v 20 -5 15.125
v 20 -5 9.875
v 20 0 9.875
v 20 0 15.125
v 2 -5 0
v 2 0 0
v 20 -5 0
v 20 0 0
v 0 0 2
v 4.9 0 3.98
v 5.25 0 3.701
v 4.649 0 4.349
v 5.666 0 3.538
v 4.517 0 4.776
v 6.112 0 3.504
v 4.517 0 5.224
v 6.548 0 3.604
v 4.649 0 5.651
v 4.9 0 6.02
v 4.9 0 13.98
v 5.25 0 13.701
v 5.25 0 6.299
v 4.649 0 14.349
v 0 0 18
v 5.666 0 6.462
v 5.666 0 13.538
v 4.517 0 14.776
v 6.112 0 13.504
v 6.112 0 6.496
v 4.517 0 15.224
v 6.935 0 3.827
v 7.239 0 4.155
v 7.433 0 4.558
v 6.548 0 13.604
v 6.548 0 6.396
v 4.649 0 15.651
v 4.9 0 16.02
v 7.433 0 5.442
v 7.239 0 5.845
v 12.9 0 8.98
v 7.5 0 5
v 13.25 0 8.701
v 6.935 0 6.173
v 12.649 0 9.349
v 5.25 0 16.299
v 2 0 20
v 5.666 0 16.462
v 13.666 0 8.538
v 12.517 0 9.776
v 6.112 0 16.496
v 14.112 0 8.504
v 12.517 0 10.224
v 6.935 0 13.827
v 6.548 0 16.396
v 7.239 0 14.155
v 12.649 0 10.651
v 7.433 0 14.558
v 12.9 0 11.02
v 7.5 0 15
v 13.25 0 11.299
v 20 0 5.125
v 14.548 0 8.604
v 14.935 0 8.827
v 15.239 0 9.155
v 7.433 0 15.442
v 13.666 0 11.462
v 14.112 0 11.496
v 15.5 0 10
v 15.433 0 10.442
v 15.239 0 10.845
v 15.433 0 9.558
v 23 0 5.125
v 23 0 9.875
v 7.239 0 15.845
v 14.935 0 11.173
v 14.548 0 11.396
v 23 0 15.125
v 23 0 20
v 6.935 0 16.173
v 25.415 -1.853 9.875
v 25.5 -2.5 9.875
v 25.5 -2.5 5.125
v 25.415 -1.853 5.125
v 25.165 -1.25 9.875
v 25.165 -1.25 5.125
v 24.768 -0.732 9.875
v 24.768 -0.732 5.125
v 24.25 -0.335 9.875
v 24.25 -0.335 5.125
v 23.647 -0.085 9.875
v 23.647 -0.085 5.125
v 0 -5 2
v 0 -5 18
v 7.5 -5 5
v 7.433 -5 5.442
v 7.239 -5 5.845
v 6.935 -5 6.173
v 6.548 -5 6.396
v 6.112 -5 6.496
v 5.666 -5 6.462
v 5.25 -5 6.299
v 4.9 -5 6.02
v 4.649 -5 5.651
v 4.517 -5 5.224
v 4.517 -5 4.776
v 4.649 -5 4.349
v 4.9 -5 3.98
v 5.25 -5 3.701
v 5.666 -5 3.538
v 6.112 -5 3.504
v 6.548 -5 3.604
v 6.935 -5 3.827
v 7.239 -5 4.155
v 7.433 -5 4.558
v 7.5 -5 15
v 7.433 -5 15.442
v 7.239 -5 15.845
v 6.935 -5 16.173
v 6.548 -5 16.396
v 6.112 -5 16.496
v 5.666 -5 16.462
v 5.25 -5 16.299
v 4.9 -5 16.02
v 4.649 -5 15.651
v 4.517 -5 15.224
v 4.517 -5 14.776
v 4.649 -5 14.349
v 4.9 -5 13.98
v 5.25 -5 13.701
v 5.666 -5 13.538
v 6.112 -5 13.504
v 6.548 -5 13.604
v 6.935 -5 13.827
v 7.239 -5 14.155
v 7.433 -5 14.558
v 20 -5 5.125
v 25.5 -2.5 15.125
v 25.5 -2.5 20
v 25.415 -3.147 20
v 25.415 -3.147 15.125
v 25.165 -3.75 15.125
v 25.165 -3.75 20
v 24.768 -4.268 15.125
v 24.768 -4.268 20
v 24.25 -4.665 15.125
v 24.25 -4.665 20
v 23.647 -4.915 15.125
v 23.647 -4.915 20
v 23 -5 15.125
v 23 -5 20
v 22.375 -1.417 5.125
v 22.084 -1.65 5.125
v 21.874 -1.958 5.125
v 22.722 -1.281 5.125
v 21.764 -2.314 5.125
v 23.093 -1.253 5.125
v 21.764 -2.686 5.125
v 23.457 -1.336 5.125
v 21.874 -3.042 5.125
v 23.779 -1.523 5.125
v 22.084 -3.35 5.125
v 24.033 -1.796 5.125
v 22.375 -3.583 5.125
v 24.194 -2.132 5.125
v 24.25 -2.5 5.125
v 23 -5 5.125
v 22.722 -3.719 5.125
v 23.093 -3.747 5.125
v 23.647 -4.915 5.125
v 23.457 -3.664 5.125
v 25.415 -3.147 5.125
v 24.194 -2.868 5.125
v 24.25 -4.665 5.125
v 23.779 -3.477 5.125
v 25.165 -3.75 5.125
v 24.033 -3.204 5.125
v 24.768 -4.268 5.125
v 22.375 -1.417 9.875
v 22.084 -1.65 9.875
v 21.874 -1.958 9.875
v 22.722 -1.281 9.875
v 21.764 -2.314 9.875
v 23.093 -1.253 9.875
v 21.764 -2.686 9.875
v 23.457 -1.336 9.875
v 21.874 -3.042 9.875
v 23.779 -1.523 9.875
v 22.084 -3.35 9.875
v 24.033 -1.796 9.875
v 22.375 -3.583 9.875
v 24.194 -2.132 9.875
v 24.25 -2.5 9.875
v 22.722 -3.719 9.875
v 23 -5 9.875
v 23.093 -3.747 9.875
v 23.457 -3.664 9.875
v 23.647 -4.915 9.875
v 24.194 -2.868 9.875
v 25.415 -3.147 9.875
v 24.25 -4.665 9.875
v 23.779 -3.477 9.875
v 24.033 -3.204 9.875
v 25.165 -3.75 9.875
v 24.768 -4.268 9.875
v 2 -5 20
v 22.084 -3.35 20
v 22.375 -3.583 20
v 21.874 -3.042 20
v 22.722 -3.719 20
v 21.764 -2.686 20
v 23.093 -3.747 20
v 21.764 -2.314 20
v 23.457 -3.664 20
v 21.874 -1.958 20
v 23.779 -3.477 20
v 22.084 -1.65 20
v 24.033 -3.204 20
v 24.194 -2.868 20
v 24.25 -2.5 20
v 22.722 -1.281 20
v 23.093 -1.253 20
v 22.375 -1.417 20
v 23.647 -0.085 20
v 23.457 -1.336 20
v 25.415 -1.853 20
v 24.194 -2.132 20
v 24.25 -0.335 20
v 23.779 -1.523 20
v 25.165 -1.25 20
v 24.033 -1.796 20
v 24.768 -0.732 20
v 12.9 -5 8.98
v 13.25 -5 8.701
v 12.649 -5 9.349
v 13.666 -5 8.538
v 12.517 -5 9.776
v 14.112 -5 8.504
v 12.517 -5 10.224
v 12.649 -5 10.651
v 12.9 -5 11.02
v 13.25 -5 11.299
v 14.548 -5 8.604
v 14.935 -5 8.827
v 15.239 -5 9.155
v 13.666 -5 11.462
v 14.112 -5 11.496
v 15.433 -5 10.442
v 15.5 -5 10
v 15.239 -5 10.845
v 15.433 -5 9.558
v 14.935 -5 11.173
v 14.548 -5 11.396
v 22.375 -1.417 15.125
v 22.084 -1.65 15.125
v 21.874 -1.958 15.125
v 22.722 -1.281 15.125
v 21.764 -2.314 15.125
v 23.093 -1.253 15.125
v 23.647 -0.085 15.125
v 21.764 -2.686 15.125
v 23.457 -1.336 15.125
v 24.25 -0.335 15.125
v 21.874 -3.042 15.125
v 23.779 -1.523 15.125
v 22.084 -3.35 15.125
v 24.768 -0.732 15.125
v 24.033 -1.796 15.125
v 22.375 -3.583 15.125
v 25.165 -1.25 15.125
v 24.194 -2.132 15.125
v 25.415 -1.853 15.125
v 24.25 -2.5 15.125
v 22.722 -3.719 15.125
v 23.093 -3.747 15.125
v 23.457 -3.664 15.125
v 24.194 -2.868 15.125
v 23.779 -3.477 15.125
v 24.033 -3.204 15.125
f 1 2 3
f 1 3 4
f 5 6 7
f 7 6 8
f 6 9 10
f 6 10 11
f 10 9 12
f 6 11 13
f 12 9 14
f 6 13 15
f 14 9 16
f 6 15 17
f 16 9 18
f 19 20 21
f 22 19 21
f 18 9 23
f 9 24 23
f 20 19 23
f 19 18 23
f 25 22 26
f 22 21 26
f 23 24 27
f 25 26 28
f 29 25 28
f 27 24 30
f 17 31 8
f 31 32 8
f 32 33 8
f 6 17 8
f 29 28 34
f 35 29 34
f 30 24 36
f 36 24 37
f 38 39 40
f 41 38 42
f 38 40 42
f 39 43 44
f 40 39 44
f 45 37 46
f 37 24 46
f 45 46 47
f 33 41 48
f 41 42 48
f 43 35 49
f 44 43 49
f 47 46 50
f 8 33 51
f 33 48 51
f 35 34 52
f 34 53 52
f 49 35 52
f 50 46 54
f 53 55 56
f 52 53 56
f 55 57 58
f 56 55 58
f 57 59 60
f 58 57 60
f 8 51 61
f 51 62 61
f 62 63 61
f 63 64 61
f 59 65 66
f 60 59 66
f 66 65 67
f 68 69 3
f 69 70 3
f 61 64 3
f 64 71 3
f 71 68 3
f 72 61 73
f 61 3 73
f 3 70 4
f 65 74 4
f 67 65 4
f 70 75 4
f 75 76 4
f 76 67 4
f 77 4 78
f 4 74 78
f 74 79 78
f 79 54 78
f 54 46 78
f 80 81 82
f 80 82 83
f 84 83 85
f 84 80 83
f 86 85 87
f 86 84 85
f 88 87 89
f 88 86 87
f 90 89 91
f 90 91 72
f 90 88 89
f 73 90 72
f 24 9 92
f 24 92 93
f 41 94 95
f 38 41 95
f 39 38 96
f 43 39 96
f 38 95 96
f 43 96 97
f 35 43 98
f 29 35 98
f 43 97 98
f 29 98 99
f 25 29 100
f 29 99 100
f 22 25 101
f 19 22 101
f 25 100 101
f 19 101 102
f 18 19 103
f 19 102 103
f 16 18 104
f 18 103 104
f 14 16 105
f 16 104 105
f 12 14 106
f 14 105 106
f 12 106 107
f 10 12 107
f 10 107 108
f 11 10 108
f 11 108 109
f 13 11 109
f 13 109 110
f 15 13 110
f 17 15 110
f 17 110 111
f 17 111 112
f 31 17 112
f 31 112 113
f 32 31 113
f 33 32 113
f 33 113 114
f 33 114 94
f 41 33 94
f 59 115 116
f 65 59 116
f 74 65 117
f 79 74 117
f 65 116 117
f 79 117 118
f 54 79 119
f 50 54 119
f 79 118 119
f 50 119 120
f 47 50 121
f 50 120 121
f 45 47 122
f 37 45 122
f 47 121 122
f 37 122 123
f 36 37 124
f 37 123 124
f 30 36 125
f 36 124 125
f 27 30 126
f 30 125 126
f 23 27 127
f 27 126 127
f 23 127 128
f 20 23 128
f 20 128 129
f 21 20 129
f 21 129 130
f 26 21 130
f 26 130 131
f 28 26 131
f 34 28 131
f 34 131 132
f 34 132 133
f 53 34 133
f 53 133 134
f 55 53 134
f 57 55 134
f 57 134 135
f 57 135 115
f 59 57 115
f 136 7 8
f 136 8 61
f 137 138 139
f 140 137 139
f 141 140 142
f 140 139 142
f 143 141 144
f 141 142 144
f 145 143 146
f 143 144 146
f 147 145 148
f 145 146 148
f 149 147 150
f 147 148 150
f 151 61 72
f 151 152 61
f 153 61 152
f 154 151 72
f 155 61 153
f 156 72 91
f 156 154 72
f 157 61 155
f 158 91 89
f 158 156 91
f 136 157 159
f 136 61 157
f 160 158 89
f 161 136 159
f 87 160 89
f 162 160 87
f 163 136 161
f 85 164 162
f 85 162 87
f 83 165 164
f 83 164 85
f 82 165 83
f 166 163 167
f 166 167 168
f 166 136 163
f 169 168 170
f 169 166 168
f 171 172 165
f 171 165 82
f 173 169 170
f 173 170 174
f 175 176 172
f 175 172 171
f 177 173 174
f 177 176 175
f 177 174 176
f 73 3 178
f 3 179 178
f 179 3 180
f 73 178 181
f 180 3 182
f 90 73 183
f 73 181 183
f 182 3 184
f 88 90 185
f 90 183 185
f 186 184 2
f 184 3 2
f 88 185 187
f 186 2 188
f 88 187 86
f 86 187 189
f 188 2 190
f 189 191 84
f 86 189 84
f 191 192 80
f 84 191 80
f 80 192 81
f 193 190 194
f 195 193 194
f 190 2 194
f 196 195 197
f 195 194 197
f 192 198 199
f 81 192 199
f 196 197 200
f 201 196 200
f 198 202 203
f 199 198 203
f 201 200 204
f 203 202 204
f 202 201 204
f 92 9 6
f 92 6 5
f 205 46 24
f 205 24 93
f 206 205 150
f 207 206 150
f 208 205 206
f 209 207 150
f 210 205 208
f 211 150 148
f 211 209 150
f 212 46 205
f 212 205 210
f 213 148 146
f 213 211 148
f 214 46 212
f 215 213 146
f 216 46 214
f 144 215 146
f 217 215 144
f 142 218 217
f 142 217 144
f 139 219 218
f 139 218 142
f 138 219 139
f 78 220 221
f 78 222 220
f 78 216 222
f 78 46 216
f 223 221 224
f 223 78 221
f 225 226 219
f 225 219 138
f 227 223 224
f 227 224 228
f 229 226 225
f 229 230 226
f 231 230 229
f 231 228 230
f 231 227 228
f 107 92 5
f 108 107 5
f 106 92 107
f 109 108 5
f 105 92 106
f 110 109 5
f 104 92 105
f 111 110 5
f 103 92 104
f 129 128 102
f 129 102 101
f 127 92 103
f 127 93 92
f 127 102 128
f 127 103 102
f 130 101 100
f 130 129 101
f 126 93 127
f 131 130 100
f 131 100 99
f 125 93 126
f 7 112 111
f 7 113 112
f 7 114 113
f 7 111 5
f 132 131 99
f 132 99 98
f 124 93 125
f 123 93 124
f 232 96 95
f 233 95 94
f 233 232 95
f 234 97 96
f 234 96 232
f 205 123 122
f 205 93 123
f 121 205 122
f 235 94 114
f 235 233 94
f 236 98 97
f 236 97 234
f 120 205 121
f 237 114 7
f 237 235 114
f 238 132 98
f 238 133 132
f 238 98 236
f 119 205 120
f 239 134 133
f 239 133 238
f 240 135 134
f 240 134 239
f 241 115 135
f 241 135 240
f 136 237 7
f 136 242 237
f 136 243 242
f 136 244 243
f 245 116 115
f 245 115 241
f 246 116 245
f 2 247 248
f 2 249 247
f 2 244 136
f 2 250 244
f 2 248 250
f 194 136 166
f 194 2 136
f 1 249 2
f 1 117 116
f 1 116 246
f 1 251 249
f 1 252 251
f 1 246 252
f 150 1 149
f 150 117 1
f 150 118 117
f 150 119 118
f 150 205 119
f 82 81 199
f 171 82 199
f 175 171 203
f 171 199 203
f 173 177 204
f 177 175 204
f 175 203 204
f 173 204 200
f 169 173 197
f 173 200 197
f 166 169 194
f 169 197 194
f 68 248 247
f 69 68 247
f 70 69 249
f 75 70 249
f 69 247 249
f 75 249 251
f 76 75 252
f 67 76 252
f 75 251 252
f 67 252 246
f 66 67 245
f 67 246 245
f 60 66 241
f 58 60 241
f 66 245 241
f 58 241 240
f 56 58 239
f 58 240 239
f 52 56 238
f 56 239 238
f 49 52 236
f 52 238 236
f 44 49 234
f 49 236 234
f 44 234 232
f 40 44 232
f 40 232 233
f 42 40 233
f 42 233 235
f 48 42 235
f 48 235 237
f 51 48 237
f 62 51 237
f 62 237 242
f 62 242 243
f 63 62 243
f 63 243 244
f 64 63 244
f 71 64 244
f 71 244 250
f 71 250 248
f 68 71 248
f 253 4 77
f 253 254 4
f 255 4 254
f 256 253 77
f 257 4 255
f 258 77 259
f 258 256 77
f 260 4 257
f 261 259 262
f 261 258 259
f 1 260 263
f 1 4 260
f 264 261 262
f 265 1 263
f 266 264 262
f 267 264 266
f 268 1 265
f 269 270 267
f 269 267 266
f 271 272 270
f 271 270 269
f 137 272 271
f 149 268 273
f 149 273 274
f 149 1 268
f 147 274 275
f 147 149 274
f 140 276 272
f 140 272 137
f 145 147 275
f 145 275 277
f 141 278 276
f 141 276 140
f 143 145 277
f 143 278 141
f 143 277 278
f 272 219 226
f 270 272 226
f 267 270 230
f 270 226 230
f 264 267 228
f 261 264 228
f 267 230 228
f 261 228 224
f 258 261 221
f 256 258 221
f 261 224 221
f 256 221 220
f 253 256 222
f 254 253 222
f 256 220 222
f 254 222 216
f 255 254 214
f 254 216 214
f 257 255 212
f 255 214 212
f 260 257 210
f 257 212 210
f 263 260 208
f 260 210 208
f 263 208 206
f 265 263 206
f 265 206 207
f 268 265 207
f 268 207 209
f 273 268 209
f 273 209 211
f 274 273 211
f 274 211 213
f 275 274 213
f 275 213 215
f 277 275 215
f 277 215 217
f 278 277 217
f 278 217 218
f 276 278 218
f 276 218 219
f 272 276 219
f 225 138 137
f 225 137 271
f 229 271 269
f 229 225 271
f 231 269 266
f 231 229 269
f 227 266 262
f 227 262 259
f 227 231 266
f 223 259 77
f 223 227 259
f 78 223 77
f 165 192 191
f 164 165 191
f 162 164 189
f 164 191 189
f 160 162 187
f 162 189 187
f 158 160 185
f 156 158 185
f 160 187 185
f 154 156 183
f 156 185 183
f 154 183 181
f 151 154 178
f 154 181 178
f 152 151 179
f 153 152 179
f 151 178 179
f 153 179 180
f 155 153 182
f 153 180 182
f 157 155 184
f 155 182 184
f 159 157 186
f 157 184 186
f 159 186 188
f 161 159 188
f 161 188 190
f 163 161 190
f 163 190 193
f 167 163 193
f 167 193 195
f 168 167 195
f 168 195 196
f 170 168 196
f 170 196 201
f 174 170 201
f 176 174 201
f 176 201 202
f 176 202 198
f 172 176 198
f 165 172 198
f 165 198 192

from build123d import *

# Parameters (mm, degrees)
F0_W     = 25.5
F0_H     = 20
F1_DEPTH = 5
F2_R     = 2.49999
F3_R     = 1.25
F4_DEPTH = 25
F5_W     = 9.4863112453
F5_H     = 5.25
F5_W_2   = 9.3420613807
F5_H_2   = 5.125
F6_DEPTH = 5.001
F7_R     = 1.5
F8_DEPTH = 25
F9_SIZE  = 2


# Not quite as in the source:
# - a fillet or chamfer is up to 0.001 mm smaller than in the source, because OpenCascade refuses the exact size


with BuildPart() as f1:
    # F0 (on Front) → F1 (new body)
    with BuildSketch(Plane.XZ):
        with Locations((12.75, 10)):
            Rectangle(F0_W, F0_H)
    extrude(amount=F1_DEPTH)

    # F2 (radius 2.5 in the source; OpenCascade refuses exactly that, so slightly less here)
    f2_edges = [f1.edges().sort_by_distance(p)[0] for p in [
        (25.5, -5, 10),
        (25.5, 0, 10),
    ]]
    fillet(f2_edges, radius=F2_R)

    # F3 (on face) → F4 (cut)
    with BuildSketch(Plane.XY.offset(20)):
        with Locations((23, -2.5)):
            Circle(F3_R)
    extrude(amount=-F4_DEPTH, mode=Mode.SUBTRACT)

    # F5 (on face) → F6 (cut, through all)
    with BuildSketch(Plane.XZ.offset(5)):
        with Locations((24.7431556227, 12.5)):
            Rectangle(F5_W, F5_H)
        with Locations((24.6710306904, 2.5625)):
            Rectangle(F5_W_2, F5_H_2)
    extrude(amount=-F6_DEPTH, mode=Mode.SUBTRACT)

    # F7 (on face) → F8 (cut)
    with BuildSketch(Plane.XZ.offset(5)):
        with Locations((14, 10)):
            Circle(F7_R)
        with Locations((6, 15)):
            Circle(F7_R)
        with Locations((6, 5)):
            Circle(F7_R)
    extrude(amount=-F8_DEPTH, mode=Mode.SUBTRACT)

    # F9
    f9_edges = [f1.edges().sort_by_distance(p)[0] for p in [
        (0, -2.5, 20),
        (0, -2.5, 0),
    ]]
    chamfer(f9_edges, length=F9_SIZE)


solid = f1.part
